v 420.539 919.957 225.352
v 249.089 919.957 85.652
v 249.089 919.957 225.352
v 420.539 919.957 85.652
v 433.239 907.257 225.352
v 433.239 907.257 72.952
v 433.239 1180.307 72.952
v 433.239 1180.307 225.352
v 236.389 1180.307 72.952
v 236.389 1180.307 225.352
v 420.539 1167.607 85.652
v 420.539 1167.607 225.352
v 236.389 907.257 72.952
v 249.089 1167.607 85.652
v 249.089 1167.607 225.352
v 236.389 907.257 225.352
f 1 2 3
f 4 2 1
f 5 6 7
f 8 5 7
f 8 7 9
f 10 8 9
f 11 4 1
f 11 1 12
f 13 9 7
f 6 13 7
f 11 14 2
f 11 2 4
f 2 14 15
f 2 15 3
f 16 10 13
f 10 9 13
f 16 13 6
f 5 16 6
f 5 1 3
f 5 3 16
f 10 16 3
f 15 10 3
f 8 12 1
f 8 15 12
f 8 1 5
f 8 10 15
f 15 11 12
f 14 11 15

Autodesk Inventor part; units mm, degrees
ref_plane "YZ Plane" through (0, 0, 0) normal (1, 0, 0) x (0, 1, 0)
ref_plane "XZ Plane" through (0, 0, 0) normal (0, 1, 0) x (-1, 0, 0)
ref_plane "Work Plane1" through (220.5144, 586.5816, 98.3522) normal (0, 0, 1) x (1, 0, 0)
sketch "Sketch1" plane through (220.5144, 586.5816, 98.3522) normal (0, 0, 1) x (1, 0, 0)
  line L0 (12.7, 622.3) -> (215.9, 622.3)
  line L1 (12.7, 317.5) -> (215.9, 317.5)
  line L2 (241.3, 317.5) -> (241.3, 596.9)
  line L3 (-12.7, 596.9) -> (-12.7, 317.5)
  line L4 (215.9, 596.9) -> (12.7, 596.9)
  line L5 (215.9, 596.9) -> (215.9, 317.5)
  line L6 (12.7, 317.5) -> (12.7, 596.9)
  line L7 (212.725, 593.725) -> (15.875, 593.725)
  line L8 (15.875, 593.725) -> (15.875, 320.675)
  line L9 (15.875, 320.675) -> (212.725, 320.675)
  line L10 (212.725, 320.675) -> (212.725, 593.725)
  point P0 (-220.5144, -586.5816)
extrude "Extrusion1" add sketch "Sketch1" along normal blind 127 and the other way blind 25.4 contours L10 L9 L8 L7
shell "Shell1" thickness 12.7 removed faces 1 at (302.006, 1089.2899, 225.3522)
sketch "Sketch2" plane through (433.2394, 907.2566, 225.3522) normal (1, 0, 0) x (0, 0, -1)
  line L0 (64.2794, 112.1381) -> (64.2794, 158.5332) construction
  line L1 (64.2794, 158.5332) -> (96.9042, 158.5332) construction
  line L2 (96.9042, 158.5332) -> (96.9042, 112.1381) construction
  line L3 (96.9042, 112.1381) -> (64.2794, 112.1381) construction
  line L4 (3.9697, 3.4317) -> (3.9697, 49.8268) construction
  line L5 (3.9697, 49.8268) -> (36.5945, 49.8268) construction
  line L6 (36.5945, 49.8268) -> (36.5945, 3.4317) construction
  line L7 (36.5945, 3.4317) -> (3.9697, 3.4317) construction
  point P0 (225.3522, -907.2566)
sketch "Sketch3" plane through (236.3894, 907.2566, 225.3522) normal (-1, 0, 0) x (0, 0, 1)
  line L0 (-63.2632, 158.0563) -> (-63.2632, 111.6612) construction
  line L1 (-63.2632, 111.6612) -> (-95.888, 111.6612) construction
  line L2 (-95.888, 111.6612) -> (-95.888, 158.0563) construction
  line L3 (-95.888, 158.0563) -> (-63.2632, 158.0563) construction
  line L4 (-5.0298, 267.8039) -> (-5.0298, 221.4088) construction
  line L5 (-5.0298, 221.4088) -> (-37.6546, 221.4088) construction
  line L6 (-37.6546, 221.4088) -> (-37.6546, 267.8039) construction
  line L7 (-37.6546, 267.8039) -> (-5.0298, 267.8039) construction
  point P0 (-225.3522, -907.2566)
properties part number "Bucket yellow"
